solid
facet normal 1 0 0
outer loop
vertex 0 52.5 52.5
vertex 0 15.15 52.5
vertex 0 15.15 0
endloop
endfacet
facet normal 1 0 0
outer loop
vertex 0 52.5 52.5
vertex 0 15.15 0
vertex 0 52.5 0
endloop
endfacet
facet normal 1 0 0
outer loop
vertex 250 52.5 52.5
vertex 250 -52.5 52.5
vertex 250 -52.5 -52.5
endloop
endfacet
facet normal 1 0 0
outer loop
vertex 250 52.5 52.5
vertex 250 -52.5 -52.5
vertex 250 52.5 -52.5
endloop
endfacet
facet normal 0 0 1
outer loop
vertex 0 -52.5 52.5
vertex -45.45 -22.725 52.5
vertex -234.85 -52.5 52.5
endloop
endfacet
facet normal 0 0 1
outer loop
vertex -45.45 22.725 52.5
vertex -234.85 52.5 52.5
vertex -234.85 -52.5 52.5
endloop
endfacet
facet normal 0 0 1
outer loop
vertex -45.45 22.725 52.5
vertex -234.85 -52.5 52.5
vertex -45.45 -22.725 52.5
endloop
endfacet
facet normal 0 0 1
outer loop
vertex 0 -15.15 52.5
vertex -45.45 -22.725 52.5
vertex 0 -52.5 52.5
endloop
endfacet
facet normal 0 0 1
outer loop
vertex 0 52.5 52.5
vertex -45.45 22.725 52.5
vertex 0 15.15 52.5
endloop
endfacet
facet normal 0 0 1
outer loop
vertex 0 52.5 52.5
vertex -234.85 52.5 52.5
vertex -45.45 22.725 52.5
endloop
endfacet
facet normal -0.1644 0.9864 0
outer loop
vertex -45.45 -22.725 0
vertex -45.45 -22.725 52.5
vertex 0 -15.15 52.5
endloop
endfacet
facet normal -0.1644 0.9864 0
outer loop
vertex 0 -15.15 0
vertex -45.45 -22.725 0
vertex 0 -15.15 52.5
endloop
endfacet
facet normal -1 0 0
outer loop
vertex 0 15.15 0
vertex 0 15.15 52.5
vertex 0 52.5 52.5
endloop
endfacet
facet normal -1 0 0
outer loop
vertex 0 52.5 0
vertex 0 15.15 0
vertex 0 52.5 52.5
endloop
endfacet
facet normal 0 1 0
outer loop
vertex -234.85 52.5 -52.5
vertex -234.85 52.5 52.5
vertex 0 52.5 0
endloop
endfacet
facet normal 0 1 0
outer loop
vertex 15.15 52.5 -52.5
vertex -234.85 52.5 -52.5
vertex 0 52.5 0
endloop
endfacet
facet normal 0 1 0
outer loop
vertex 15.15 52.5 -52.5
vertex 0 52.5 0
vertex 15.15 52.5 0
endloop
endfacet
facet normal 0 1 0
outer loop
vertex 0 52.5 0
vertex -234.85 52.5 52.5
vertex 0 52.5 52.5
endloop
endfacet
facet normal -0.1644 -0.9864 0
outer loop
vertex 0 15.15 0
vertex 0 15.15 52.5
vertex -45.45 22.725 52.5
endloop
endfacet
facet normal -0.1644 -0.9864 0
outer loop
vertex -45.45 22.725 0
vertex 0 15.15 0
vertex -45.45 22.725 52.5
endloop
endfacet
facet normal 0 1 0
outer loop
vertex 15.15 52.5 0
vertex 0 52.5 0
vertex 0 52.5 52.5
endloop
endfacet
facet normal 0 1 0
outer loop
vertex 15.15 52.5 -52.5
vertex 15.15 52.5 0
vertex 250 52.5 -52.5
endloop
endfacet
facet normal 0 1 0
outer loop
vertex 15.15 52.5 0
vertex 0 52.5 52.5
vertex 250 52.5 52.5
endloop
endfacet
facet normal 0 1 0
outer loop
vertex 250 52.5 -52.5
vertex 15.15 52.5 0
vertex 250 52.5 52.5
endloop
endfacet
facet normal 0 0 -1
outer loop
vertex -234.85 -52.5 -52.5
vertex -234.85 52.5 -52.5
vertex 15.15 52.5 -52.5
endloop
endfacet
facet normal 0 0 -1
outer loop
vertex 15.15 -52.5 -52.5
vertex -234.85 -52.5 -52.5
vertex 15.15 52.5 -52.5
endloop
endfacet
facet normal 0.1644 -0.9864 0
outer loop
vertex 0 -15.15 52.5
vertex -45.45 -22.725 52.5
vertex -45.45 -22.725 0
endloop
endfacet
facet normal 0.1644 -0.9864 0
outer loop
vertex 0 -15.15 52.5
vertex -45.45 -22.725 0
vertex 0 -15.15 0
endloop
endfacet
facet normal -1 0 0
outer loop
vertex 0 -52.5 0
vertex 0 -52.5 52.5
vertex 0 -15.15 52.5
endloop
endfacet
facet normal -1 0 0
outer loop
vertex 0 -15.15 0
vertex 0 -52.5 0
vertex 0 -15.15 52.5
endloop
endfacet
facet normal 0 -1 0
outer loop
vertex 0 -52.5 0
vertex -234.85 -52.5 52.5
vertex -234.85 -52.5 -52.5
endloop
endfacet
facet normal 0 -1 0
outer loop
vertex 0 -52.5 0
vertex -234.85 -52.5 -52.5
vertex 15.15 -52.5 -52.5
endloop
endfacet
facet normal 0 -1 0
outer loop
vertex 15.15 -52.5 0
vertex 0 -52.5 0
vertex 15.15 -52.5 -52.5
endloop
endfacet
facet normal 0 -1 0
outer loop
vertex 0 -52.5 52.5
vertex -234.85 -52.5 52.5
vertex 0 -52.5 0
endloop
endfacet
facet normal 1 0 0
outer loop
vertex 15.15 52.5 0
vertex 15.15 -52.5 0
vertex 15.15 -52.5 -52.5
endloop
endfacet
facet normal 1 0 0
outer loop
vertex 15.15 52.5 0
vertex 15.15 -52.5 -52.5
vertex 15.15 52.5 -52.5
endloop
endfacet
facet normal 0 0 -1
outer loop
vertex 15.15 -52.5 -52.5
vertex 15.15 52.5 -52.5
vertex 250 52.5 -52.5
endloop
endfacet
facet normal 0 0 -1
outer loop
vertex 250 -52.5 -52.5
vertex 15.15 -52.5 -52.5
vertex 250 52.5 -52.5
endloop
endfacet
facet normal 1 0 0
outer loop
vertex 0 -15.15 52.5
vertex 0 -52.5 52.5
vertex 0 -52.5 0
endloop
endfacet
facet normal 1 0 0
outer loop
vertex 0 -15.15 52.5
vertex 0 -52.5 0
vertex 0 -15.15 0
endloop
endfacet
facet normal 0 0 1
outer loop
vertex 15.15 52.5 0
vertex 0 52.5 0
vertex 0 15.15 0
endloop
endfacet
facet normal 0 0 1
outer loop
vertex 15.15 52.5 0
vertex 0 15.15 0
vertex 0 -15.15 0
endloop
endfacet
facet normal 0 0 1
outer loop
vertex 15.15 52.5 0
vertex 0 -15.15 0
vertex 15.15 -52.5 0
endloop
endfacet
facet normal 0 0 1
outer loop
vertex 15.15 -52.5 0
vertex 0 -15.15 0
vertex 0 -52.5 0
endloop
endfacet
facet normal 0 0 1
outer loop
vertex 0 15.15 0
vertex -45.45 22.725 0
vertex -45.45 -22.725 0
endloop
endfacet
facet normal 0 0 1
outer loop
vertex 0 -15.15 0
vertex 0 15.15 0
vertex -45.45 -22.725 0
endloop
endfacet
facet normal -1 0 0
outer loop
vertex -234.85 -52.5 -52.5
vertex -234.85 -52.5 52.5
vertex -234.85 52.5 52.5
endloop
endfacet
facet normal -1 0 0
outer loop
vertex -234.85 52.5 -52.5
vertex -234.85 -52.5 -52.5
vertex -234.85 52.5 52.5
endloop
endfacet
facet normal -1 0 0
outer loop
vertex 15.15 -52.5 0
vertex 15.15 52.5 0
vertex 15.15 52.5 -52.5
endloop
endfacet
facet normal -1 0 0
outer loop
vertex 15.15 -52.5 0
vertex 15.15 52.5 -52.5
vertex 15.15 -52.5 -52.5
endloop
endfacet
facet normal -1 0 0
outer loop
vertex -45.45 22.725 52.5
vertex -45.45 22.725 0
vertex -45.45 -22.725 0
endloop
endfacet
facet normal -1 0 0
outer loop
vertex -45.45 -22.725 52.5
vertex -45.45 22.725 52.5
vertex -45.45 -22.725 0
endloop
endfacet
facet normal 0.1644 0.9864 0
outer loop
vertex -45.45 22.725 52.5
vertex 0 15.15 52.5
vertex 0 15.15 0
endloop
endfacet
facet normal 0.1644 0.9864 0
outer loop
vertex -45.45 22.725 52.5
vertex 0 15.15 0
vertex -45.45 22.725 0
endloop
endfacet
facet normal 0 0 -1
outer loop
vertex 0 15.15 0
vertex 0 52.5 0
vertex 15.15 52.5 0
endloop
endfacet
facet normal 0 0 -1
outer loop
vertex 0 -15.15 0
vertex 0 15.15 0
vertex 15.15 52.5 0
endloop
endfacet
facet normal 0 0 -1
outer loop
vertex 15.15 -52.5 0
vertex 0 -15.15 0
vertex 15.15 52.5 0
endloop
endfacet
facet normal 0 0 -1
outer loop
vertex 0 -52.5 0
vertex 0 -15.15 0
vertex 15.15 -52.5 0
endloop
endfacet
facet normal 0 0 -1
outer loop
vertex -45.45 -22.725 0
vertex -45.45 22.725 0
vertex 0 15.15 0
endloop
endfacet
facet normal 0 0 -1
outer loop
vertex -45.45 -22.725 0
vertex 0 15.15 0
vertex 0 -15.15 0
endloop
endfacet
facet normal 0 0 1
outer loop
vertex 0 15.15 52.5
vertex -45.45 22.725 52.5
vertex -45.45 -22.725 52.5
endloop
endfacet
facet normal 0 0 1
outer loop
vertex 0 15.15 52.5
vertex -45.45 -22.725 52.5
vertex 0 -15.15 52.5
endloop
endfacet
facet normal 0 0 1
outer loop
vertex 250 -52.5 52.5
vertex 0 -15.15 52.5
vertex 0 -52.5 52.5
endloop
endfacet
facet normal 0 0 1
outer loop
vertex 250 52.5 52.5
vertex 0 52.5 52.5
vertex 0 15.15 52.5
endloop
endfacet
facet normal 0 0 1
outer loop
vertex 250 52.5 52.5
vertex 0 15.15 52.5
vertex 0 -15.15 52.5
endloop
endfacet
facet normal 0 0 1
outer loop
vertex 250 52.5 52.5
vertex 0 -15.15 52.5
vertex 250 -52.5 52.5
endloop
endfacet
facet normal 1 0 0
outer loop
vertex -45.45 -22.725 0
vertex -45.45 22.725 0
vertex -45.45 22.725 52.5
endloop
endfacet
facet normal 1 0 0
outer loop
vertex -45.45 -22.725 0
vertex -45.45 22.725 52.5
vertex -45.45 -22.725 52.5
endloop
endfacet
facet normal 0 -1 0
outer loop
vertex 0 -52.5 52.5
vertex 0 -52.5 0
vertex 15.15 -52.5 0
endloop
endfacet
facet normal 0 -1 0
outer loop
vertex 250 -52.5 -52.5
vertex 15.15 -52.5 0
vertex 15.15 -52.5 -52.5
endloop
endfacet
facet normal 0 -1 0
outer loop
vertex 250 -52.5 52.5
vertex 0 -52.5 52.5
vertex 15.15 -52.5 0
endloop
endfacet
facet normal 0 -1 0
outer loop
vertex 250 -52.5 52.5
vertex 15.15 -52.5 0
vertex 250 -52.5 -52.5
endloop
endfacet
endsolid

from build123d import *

# Parameters (mm, degrees)
F0_W          = 250
F0_H          = 105
F1_DEPTH      = 52.5
F2_W          = 105
F2_H          = 52.5
F3_DEPTH      = 15.15
F5_DEPTH      = 52.5
F6_W          = 250
F6_H          = 105
F7_DEPTH      = 52.5
F7_DEPTH_BACK = 52.5


with BuildPart() as f1:
    # F0 (on Top) → F1 (new body, symmetric)
    with BuildSketch(Plane.XY):
        with Locations((125, 0)):
            Rectangle(F0_W, F0_H)
    extrude(amount=F1_DEPTH, both=True)

    # F2 (on face) → F3 (cut)
    with BuildSketch(Plane(origin=(0, 0, 0), x_dir=(0, -1, 0), z_dir=(-1, 0, 0))):
        with Locations((0, -26.25)):
            Rectangle(F2_W, F2_H)
    extrude(amount=-F3_DEPTH, mode=Mode.SUBTRACT)

    # F4 (on face) → F5 (join, through all)
    with BuildSketch(Plane.XY.offset(52.5)):
        Polygon((0, -15.15), (0, 15.15), (-45.45, 22.725), (-45.45, -22.725), align=None)
    extrude(amount=-F5_DEPTH)


with BuildPart() as f7:
    # F6 (on Top) → F7 (new body, two sides)
    with BuildSketch(Plane.XY) as f7_sk:
        with Locations((-109.85, 0)):
            Rectangle(F6_W, F6_H)
    extrude(amount=F7_DEPTH)
    extrude(f7_sk.sketch, amount=-F7_DEPTH_BACK)

    # F8: cut F1
    add(f1.part, mode=Mode.SUBTRACT)


solid = Compound([f1.part, f7.part])
